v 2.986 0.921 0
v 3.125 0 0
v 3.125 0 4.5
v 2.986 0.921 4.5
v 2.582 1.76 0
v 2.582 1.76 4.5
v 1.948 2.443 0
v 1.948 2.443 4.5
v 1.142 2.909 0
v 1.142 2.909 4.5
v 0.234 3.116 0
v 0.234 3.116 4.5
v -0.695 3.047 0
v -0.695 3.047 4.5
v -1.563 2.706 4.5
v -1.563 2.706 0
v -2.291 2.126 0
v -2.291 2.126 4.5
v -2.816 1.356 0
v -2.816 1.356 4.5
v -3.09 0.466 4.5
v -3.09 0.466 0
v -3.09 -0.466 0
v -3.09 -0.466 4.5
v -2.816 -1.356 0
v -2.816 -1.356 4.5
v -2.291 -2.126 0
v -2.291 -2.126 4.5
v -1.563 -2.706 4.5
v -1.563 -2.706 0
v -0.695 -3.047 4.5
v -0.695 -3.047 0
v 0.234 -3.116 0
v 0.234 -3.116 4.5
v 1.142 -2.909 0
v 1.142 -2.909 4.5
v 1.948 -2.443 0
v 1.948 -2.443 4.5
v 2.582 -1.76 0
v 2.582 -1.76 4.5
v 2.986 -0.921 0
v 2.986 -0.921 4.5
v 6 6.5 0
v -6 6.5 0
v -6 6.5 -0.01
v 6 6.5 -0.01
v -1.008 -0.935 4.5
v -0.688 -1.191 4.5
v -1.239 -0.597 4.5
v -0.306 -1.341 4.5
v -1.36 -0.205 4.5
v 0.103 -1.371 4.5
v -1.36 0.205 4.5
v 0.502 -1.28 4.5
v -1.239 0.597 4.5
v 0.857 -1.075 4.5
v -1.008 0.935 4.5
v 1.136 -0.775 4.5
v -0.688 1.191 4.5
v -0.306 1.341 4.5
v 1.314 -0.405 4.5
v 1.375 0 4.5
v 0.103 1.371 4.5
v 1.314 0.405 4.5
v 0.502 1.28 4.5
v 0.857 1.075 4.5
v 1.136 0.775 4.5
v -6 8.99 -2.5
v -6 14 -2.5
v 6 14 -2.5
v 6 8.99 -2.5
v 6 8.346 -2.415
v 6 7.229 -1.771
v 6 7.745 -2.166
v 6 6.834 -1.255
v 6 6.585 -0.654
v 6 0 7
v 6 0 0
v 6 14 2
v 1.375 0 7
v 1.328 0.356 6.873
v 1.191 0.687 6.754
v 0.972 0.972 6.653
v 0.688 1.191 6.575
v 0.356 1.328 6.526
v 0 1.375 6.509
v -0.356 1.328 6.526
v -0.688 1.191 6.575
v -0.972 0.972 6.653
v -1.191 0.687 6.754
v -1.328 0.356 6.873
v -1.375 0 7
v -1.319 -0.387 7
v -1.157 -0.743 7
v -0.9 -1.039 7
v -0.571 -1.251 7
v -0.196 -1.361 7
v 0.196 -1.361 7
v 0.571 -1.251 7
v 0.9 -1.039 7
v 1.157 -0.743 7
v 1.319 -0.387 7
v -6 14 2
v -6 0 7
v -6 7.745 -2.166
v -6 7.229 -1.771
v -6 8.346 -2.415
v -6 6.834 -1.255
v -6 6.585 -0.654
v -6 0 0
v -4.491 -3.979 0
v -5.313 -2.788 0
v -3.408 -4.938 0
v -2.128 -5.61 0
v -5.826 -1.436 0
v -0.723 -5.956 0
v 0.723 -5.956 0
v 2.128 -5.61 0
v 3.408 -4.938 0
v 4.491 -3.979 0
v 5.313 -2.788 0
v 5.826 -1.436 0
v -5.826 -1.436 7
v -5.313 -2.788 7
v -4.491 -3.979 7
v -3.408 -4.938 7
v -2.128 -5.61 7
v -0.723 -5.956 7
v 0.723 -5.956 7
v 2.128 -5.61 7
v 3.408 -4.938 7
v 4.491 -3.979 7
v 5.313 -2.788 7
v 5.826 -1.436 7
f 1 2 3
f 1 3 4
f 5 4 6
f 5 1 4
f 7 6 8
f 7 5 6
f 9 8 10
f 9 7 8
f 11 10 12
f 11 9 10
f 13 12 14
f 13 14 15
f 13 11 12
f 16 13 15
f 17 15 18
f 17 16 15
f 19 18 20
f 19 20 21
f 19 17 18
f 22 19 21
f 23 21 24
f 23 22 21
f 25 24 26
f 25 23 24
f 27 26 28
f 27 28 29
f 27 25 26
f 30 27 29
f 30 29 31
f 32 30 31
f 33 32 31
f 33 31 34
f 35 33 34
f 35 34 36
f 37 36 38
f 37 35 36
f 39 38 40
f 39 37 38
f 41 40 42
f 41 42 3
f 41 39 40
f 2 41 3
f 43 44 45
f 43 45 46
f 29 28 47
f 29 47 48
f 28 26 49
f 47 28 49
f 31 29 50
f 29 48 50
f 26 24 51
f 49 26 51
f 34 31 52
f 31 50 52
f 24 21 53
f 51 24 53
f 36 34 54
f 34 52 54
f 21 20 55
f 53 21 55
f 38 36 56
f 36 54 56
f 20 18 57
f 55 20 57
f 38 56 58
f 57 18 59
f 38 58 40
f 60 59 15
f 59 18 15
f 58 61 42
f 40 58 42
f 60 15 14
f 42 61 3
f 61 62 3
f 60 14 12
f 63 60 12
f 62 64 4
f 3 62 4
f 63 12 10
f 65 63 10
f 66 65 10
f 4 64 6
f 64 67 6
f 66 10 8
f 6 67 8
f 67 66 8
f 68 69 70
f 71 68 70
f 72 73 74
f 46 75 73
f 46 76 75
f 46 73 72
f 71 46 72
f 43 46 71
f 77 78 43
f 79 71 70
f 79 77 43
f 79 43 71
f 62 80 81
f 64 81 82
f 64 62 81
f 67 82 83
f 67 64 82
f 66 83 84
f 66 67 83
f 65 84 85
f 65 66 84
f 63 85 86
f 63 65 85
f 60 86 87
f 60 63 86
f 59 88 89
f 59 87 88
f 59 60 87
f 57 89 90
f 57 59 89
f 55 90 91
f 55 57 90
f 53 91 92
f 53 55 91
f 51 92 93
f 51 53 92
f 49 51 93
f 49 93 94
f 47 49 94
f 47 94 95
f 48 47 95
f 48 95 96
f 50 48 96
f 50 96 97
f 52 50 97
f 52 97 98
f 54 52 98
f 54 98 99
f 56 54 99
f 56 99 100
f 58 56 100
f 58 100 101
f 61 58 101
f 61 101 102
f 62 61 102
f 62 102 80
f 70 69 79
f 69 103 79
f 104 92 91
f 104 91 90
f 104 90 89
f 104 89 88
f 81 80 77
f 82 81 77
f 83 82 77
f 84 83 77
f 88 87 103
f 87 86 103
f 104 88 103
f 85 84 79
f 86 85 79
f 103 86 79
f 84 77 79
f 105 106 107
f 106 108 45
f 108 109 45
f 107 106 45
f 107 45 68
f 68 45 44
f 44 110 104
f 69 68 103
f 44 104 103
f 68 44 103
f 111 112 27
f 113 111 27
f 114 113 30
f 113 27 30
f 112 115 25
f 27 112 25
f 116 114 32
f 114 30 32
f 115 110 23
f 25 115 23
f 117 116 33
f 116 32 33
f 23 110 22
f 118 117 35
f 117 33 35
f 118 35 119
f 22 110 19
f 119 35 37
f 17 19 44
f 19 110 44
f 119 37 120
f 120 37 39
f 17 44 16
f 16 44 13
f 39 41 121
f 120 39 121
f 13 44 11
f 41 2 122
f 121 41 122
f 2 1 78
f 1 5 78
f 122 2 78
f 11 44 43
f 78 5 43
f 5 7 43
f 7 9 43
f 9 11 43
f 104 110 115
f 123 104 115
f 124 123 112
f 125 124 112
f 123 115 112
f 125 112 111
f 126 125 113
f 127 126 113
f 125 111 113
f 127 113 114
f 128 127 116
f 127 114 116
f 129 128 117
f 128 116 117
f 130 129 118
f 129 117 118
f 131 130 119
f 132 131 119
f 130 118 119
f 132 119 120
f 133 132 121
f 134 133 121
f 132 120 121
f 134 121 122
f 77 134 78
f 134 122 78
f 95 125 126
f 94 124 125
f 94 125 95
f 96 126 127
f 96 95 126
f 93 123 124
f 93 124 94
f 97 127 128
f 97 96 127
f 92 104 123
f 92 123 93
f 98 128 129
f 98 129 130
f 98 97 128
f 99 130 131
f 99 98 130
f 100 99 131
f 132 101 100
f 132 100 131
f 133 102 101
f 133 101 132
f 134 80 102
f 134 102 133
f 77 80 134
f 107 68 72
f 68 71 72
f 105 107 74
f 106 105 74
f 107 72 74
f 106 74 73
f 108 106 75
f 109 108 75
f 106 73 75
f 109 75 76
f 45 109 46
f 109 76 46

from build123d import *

# Parameters (mm, degrees)
SKETCH114_R          = 1.375
PAD047_DEPTH         = 7
POCKET060_DEPTH      = 100
POCKET060_DEPTH_BACK = 100
SKETCH116_R          = 3.125
POCKET061_DEPTH      = 4.5
SKETCH117_W          = 12
SKETCH117_H          = 7.5
PAD048_DEPTH         = 2.5
FILLET025_R          = 2.49


with BuildPart() as part:
    # Sketch114 → Pad047 (new body)
    with BuildSketch(Plane.XY):
        with BuildLine():
            ThreePointArc((-6, 0), (0, -6), (6, 0))
            Line((6, 0), (6, 14))
            Line((-6, 14), (6, 14))
            Line((-6, 0), (-6, 14))
        make_face()
        Circle(SKETCH114_R, mode=Mode.SUBTRACT)
    extrude(amount=PAD047_DEPTH)

    # Sketch115 → Pocket060 (cut, two sides)
    with BuildSketch(Plane.YZ) as pocket060_sk:
        Polygon((0, 7), (14, 2), (14, 15.229534), align=None)
    extrude(amount=-POCKET060_DEPTH, mode=Mode.SUBTRACT)
    extrude(pocket060_sk.sketch, amount=POCKET060_DEPTH_BACK, mode=Mode.SUBTRACT)

    # Sketch116 → Pocket061 (cut)
    with BuildSketch(Plane.XY):
        Circle(SKETCH116_R)
    extrude(amount=POCKET061_DEPTH, mode=Mode.SUBTRACT)

    # Sketch117 → Pad048 (join)
    with BuildSketch(Plane.XY):
        with Locations((0, 10.25)):
            Rectangle(SKETCH117_W, SKETCH117_H)
    extrude(amount=-PAD048_DEPTH)

    # Fillet025
    fillet025_edges = [part.edges().sort_by_distance(p)[0] for p in [
        (0, 6.5, -2.5),
    ]]
    fillet(fillet025_edges, radius=FILLET025_R)


solid = part.part
